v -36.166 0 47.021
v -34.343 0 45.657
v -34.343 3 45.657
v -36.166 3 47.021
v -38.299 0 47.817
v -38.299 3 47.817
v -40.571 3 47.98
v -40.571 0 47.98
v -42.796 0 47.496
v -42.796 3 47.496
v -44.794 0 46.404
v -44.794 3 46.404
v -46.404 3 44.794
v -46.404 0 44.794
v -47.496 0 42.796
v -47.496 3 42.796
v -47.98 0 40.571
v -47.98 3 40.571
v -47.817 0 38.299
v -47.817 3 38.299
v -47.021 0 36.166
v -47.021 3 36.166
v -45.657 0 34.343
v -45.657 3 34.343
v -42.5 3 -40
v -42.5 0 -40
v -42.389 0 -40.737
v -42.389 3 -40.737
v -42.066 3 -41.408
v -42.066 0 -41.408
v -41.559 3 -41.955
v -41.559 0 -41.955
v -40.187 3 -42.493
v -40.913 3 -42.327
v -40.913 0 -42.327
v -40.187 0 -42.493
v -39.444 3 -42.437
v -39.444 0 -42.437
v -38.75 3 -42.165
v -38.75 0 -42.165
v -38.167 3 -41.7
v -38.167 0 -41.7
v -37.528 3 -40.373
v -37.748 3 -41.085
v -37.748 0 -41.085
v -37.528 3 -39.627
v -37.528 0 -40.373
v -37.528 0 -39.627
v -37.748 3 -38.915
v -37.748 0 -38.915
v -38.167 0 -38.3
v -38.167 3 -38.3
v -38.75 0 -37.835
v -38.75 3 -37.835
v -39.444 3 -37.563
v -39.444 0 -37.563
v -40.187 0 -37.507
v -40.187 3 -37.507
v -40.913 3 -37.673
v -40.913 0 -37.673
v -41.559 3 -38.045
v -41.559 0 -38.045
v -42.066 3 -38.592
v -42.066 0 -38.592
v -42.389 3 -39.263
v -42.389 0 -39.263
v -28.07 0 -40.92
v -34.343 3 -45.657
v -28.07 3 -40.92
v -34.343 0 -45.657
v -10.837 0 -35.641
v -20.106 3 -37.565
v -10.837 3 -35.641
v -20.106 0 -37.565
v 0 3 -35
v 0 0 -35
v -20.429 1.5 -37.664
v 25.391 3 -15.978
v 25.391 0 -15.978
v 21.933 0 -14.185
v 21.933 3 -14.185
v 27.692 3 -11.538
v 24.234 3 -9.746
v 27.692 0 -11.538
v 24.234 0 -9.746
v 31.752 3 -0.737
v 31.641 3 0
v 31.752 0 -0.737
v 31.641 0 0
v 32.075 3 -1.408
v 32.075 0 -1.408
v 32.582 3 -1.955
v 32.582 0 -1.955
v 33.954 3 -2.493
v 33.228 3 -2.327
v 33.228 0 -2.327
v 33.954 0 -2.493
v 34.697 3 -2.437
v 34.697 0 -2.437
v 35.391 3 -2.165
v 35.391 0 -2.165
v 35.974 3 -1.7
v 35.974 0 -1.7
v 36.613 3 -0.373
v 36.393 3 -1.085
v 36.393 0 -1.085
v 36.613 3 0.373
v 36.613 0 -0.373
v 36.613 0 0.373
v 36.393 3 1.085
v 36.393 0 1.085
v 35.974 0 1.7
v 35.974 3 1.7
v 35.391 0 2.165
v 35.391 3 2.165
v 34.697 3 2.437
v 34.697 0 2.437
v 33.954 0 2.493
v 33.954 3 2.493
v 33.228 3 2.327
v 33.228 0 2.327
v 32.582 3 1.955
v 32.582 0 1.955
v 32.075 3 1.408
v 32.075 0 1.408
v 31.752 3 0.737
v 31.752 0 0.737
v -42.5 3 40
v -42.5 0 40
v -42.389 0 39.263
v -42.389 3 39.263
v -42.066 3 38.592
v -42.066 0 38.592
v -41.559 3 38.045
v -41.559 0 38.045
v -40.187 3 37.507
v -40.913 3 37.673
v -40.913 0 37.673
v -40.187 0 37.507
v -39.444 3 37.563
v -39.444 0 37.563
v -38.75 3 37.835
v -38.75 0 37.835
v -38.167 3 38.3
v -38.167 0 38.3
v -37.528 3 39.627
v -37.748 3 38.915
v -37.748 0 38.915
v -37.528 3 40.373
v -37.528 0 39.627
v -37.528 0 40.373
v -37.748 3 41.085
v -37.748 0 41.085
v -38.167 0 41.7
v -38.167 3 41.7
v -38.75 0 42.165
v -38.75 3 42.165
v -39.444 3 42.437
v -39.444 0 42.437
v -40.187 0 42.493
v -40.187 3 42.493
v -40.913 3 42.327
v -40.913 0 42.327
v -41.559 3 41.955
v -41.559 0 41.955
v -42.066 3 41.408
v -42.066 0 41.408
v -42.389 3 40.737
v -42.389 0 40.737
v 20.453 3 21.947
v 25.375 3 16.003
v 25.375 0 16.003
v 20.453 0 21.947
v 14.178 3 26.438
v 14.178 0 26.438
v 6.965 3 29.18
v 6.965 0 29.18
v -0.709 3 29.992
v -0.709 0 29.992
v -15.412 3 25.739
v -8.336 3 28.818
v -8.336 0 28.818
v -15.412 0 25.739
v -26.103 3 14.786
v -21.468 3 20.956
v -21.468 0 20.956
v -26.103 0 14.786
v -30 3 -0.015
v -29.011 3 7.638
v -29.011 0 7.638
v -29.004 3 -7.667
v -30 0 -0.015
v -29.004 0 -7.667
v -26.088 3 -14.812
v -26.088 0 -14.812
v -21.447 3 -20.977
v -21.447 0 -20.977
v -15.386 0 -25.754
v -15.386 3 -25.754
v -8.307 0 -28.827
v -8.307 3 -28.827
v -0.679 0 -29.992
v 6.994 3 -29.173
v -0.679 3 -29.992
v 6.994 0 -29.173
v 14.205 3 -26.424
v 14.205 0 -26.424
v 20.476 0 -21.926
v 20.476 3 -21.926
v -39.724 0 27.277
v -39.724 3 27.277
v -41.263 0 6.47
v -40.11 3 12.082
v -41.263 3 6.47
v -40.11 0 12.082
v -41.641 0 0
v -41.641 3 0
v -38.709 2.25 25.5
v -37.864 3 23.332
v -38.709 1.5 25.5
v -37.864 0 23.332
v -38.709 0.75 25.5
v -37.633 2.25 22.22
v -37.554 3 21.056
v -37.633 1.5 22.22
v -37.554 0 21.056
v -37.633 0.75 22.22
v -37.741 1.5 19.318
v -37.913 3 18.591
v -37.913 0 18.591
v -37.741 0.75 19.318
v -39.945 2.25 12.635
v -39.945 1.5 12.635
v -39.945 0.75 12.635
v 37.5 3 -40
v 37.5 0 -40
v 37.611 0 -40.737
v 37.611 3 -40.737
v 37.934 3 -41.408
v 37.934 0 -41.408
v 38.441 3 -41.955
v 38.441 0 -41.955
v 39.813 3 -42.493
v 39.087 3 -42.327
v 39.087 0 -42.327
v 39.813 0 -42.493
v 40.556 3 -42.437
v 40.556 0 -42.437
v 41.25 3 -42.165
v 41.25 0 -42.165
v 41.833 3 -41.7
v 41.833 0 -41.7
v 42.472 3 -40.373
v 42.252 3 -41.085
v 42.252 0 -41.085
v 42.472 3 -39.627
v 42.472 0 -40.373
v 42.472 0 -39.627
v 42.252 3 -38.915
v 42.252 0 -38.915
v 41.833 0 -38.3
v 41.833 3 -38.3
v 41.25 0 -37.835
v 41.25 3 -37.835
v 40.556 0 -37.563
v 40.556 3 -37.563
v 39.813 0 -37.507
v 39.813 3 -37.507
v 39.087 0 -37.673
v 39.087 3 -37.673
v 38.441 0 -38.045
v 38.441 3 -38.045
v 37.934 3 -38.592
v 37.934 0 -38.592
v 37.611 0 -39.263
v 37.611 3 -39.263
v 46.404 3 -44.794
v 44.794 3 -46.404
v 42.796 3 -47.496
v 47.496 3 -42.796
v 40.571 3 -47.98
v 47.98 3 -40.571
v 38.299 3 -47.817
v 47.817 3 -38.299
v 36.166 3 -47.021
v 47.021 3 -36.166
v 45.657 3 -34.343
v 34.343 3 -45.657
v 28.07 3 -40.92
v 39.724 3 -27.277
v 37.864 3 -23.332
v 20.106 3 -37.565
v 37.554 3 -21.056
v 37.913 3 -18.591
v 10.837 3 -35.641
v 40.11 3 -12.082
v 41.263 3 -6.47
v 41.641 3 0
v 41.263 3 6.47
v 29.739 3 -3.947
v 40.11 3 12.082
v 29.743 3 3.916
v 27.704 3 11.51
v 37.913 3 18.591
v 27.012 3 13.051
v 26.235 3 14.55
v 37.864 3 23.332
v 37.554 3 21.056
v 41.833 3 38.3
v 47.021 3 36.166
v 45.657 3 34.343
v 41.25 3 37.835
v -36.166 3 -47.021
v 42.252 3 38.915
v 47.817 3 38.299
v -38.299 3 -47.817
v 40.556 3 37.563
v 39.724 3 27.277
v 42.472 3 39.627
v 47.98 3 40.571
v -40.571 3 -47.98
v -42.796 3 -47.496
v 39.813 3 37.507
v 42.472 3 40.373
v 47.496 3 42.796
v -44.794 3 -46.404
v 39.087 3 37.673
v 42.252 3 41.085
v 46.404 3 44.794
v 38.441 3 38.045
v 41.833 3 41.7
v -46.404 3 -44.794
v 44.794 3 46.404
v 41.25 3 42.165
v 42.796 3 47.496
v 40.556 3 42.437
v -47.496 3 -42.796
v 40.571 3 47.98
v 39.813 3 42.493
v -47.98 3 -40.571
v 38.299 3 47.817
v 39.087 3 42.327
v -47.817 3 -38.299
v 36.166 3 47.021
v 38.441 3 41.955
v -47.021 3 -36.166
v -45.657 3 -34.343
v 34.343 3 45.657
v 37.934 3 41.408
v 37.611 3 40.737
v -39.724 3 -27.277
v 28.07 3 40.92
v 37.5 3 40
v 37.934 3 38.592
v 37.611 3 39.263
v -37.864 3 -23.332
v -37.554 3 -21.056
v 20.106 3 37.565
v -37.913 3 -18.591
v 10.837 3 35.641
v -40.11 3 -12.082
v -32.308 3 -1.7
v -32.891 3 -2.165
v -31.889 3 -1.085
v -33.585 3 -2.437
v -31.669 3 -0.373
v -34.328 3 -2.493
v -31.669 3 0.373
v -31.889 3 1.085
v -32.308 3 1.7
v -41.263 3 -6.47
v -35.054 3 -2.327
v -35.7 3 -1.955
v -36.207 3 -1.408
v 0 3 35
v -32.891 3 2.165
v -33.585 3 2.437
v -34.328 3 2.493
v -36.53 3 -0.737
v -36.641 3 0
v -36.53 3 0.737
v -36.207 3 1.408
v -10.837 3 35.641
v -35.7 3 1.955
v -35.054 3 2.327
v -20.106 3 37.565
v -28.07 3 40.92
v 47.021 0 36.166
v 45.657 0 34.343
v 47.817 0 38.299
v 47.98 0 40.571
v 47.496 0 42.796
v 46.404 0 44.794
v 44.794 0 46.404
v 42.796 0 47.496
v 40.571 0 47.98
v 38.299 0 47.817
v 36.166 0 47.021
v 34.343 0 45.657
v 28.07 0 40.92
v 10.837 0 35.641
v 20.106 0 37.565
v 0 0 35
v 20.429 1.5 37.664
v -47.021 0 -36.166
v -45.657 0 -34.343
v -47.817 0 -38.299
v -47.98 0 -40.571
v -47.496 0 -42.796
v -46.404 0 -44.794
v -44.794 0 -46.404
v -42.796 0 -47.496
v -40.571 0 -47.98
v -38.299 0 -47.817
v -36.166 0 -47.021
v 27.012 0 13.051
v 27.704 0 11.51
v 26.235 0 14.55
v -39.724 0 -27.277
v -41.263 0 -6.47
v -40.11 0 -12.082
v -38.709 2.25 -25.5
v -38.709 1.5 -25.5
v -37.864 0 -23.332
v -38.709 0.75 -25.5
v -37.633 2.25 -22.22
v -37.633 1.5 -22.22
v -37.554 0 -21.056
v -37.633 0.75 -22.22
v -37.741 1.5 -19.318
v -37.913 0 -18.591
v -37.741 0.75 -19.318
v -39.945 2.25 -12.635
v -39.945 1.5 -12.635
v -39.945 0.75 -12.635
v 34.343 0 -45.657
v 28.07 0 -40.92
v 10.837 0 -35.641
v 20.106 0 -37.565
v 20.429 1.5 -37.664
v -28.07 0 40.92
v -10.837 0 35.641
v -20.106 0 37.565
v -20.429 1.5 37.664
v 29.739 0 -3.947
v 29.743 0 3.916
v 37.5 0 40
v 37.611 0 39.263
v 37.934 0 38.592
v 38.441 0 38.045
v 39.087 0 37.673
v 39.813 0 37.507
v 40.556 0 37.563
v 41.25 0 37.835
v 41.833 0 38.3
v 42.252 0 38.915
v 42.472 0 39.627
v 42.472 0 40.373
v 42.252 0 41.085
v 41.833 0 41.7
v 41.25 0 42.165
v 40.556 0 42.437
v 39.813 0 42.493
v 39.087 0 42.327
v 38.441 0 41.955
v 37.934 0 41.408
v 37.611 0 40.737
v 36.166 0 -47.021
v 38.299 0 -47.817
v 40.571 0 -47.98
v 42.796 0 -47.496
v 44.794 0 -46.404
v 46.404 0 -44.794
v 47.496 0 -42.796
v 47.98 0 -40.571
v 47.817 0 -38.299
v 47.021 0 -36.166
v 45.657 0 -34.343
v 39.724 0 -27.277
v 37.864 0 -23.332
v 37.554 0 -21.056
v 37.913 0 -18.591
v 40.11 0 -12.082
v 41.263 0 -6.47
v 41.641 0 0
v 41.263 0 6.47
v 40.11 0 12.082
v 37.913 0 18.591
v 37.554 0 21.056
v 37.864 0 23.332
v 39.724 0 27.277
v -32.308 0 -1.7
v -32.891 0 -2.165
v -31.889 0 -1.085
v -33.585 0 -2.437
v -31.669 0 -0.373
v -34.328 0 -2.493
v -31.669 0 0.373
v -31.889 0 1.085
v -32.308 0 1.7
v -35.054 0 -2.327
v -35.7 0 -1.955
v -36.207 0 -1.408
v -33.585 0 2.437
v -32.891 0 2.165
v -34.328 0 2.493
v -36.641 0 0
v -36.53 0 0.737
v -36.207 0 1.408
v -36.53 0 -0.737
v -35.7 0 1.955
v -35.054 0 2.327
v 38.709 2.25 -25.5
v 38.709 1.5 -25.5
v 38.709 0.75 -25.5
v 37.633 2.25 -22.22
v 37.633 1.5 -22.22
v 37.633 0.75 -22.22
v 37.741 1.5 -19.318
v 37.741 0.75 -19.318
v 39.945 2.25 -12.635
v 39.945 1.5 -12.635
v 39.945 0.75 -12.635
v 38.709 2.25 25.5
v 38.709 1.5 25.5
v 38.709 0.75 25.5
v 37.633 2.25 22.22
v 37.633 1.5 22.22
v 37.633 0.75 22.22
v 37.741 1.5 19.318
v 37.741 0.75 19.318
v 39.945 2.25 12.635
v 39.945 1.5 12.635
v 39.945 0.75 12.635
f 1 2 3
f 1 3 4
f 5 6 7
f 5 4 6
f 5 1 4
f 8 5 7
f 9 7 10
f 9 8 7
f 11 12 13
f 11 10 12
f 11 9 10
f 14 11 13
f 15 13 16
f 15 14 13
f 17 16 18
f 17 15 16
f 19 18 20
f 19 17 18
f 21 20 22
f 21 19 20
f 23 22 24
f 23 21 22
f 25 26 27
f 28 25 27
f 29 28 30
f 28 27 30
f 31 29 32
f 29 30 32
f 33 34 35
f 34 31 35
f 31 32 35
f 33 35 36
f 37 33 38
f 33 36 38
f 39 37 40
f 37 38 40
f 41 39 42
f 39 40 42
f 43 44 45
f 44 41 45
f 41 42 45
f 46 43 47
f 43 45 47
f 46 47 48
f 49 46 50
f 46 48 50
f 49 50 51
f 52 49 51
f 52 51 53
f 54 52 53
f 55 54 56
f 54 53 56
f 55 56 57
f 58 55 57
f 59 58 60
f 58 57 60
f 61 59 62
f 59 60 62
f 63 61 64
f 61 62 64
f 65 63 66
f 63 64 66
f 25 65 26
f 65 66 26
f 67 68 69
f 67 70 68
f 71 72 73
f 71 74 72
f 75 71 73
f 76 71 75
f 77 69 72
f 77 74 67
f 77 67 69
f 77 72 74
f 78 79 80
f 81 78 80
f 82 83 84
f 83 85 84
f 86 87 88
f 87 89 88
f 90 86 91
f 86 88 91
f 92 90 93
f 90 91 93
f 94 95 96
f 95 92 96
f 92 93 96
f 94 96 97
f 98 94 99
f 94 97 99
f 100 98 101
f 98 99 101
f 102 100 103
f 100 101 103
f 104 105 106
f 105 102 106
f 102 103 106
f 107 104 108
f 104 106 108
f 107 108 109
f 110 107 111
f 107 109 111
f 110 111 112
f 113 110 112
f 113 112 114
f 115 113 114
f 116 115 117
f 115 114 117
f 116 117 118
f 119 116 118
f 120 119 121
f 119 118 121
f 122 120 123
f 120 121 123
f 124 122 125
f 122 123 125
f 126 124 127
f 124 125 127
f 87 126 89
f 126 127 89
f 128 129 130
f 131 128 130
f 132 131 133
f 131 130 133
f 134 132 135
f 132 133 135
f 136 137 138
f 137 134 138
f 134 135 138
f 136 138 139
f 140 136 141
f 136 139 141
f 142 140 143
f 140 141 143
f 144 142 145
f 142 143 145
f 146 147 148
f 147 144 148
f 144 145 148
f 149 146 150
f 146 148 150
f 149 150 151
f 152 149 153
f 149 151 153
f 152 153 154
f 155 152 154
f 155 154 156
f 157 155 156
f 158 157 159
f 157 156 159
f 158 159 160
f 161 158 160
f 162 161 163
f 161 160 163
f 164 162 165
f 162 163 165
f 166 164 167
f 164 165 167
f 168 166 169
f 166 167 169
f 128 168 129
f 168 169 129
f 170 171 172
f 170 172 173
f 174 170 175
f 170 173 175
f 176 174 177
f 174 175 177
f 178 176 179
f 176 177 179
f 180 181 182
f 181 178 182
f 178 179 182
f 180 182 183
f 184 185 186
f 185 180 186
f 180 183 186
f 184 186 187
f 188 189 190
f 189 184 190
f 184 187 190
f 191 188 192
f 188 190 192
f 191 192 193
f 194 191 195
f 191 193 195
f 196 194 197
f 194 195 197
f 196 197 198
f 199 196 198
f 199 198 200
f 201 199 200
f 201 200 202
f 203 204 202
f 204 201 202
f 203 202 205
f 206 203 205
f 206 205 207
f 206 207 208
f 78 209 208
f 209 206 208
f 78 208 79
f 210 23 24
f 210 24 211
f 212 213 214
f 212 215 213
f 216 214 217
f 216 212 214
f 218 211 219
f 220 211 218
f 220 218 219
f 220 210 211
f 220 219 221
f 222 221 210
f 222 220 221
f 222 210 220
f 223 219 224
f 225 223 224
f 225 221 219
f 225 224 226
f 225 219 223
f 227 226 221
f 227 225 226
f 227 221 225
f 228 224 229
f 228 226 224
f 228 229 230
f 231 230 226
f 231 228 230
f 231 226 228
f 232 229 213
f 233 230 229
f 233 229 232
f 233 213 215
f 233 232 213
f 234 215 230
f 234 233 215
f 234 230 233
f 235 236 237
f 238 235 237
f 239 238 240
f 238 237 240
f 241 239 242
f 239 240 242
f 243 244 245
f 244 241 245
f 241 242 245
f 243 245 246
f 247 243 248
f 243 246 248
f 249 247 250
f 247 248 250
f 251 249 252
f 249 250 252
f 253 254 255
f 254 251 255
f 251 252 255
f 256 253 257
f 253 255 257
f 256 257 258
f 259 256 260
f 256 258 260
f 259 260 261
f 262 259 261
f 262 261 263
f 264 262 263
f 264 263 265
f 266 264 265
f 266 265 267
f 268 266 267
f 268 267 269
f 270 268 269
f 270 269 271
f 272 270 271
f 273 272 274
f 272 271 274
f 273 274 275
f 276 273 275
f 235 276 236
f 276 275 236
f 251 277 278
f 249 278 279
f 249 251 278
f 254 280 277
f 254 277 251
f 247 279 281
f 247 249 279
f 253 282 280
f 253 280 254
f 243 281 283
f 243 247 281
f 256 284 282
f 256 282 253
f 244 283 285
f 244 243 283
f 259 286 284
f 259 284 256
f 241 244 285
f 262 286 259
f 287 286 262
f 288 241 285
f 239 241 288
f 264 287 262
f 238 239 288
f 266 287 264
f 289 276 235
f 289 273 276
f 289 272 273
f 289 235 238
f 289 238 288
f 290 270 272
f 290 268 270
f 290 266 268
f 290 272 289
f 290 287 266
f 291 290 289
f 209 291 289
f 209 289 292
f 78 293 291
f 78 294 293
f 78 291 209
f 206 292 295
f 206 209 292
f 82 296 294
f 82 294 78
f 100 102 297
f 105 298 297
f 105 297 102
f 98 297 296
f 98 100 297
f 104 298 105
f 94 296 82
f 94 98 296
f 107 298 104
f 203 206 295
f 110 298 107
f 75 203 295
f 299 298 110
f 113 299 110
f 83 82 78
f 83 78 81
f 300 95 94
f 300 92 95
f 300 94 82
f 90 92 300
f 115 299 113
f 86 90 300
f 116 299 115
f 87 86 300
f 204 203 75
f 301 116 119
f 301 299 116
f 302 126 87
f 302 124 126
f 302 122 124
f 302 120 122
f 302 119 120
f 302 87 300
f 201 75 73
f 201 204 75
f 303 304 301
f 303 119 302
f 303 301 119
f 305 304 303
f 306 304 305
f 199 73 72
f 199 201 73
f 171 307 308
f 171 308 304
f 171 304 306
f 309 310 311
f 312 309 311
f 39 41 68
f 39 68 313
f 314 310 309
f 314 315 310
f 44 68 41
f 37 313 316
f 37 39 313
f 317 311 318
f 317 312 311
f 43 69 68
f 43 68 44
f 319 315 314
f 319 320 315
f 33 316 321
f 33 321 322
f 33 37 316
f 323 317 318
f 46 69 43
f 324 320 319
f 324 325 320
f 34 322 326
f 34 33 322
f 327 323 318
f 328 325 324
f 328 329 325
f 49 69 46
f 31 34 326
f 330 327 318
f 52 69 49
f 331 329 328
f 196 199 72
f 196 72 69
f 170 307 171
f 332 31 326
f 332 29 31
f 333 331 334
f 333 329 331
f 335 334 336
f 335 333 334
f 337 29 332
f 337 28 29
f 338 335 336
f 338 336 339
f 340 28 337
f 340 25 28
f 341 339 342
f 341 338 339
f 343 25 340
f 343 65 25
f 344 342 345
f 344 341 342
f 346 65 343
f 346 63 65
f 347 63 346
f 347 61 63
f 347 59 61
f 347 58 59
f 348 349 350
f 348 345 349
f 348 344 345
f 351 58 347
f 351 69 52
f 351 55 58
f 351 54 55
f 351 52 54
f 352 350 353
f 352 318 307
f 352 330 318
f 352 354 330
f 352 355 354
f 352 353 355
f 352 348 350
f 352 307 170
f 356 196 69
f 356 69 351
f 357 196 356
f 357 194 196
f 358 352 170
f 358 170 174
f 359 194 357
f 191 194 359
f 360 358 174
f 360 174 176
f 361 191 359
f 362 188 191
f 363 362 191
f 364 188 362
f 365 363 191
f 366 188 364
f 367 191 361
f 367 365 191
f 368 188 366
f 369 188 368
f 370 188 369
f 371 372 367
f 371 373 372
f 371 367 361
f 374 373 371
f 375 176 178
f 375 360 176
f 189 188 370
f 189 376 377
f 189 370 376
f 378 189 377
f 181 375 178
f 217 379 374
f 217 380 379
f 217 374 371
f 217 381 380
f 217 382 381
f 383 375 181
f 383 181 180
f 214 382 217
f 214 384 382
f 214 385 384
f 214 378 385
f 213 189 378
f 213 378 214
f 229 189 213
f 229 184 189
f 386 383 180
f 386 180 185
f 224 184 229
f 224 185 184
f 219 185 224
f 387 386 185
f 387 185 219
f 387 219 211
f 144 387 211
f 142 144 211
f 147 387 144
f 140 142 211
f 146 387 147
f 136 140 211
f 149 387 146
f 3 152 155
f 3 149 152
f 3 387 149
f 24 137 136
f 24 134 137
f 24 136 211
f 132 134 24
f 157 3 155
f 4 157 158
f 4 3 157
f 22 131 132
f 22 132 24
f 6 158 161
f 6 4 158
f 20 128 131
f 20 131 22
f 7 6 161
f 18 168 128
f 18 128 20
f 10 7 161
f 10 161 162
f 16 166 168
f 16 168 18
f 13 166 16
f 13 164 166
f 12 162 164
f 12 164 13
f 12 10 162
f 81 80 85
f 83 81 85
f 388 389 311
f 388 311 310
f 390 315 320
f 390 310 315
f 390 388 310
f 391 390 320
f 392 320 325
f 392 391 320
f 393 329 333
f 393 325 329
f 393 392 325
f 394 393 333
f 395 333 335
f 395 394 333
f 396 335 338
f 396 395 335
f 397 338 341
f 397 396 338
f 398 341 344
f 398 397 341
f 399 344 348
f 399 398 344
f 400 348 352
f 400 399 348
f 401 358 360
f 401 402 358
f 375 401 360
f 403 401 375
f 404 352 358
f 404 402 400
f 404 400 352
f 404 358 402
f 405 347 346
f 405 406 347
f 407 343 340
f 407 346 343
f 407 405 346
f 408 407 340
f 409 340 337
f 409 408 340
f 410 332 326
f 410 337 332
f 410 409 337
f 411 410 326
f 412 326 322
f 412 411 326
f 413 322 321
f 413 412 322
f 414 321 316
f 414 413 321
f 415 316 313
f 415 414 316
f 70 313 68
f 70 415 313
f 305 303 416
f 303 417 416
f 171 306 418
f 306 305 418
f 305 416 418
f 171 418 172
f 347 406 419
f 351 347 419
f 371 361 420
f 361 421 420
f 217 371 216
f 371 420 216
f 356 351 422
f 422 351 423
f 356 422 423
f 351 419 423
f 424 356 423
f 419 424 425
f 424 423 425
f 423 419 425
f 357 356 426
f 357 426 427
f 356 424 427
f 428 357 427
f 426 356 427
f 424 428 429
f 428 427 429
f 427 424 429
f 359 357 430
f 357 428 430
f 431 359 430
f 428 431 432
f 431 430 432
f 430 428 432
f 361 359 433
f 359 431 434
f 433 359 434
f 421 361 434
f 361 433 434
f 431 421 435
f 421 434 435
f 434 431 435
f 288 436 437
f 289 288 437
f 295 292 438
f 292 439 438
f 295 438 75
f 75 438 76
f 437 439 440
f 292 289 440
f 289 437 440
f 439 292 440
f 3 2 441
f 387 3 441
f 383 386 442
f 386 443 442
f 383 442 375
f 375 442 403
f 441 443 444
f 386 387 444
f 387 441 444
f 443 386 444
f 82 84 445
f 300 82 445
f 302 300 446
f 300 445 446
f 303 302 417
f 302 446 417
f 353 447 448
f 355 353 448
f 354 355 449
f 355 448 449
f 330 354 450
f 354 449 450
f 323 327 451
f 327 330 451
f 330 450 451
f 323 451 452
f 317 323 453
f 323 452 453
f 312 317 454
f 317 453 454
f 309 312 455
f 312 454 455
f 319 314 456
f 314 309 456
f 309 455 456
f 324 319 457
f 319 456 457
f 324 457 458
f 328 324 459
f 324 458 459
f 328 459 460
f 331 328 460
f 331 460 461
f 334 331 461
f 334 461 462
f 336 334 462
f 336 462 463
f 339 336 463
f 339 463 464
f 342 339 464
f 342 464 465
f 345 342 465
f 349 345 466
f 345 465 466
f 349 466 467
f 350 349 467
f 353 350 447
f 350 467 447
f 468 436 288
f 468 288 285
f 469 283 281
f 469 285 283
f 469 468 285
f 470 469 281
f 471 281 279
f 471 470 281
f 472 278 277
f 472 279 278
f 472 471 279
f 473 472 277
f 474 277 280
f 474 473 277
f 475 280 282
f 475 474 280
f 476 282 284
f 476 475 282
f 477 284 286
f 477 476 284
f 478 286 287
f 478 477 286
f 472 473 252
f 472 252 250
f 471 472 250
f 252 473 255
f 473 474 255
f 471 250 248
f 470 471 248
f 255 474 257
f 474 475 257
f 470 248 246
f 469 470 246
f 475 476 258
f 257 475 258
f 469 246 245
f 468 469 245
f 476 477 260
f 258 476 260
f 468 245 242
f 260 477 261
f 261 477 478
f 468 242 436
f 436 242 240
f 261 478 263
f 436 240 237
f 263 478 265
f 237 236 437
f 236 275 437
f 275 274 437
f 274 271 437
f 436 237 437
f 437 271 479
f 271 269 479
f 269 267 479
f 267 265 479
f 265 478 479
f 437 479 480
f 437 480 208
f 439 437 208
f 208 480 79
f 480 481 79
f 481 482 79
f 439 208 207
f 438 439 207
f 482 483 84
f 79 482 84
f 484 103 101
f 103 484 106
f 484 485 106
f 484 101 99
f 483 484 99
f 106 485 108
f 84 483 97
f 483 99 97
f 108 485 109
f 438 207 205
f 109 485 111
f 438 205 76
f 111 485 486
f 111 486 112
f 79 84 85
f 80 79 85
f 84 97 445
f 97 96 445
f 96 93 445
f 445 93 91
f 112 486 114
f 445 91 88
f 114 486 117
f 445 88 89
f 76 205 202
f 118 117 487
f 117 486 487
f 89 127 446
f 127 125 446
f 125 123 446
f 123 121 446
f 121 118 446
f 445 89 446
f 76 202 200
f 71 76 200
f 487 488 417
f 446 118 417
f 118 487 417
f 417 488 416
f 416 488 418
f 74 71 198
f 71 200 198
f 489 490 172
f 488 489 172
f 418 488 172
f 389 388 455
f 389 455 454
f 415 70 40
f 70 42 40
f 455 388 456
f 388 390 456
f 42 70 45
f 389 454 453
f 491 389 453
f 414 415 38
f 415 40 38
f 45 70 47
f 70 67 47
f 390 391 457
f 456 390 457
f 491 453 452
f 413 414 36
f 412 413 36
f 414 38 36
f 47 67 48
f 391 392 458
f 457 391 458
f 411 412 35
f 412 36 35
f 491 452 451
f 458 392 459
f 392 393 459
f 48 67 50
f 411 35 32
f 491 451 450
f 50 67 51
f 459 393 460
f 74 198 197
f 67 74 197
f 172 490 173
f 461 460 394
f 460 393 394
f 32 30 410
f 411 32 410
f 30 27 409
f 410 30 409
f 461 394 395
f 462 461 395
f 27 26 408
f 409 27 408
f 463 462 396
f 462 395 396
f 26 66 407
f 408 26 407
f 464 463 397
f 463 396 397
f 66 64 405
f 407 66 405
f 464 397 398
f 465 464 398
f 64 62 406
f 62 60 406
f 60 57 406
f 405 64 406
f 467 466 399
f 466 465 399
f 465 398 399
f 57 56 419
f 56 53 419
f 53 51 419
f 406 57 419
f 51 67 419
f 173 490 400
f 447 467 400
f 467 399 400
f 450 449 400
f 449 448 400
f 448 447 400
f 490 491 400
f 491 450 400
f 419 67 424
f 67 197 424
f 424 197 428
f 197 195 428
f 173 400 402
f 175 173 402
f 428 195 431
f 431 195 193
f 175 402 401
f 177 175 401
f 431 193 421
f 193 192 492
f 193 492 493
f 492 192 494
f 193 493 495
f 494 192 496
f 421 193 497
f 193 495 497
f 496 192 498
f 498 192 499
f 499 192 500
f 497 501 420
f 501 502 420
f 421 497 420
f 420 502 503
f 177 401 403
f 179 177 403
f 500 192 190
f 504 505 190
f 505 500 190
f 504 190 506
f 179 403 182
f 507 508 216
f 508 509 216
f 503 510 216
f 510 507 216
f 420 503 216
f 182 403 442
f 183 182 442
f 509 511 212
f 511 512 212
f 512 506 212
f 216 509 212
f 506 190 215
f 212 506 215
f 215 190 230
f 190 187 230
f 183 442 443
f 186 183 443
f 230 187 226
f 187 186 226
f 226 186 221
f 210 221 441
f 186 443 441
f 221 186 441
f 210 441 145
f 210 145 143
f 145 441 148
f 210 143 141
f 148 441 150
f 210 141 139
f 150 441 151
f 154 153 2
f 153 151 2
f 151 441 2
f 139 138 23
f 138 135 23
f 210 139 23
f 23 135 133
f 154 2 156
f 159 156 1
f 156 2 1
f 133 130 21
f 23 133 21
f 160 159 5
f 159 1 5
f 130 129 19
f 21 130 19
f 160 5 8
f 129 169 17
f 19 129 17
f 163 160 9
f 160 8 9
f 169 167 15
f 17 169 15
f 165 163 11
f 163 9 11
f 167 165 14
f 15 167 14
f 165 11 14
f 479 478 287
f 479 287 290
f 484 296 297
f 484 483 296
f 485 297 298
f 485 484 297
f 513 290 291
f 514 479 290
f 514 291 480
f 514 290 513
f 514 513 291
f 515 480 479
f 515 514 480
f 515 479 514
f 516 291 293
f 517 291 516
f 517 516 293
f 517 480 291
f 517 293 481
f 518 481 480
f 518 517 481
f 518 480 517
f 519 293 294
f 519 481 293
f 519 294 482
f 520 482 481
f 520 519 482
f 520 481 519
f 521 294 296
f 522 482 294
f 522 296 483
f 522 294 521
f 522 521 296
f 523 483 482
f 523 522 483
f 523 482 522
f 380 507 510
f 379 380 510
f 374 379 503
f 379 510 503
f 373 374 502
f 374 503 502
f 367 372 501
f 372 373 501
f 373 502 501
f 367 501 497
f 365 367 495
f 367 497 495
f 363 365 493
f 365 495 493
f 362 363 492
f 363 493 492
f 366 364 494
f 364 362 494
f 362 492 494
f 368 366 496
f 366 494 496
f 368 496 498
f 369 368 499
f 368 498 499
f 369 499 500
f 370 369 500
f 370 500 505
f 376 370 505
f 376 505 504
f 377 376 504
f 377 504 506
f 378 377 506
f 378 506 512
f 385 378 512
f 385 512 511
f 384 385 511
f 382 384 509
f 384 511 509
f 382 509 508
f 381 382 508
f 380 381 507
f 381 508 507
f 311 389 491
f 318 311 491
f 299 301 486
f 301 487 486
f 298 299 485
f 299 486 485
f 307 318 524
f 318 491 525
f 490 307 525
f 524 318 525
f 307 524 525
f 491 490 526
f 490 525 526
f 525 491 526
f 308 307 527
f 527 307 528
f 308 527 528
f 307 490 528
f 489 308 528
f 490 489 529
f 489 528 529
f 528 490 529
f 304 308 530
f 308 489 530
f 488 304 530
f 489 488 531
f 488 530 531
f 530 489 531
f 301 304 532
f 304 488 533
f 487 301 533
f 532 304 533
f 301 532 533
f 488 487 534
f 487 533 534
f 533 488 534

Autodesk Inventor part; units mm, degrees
ref_plane "YZ Plane" through (0, 0, 0) normal (1, 0, 0) x (0, 1, 0)
ref_plane "XZ Plane" through (0, 0, 0) normal (0, 1, 0) x (-1, 0, 0)
ref_plane "XY Plane" through (0, 0, 0) normal (0, 0, 1) x (1, 0, 0)
sketch "Sketch1" plane through (0, 0, 0) normal (0, 1, 0) x (-1, 0, 0)
  arc A0 (-27.704, 11.5104) -> (-27.6923, -11.5384) centre (0, 0) ccw
  line L0 (0, 0) -> (-57.7769, 0) construction
  circle A1 centre (34.141, 0) radius 2.5
  circle A2 centre (-34.141, 0) radius 2.5
  line L1 (34.141, 0) -> (-34.141, 0) construction
  line L2 (40, -40) -> (-40, -40) construction
  line L3 (-40, -40) -> (-40, 40) construction
  line L4 (-40, 40) -> (40, 40) construction
  line L5 (40, 40) -> (40, -40) construction
  line L6 (40, -40) -> (-40, 40) construction
  line L7 (-40, -40) -> (40, 40) construction
  circle A3 centre (40, -40) radius 2.5
  circle A4 centre (-40, -40) radius 2.5
  circle A5 centre (40, 40) radius 2.5
  circle A6 centre (-40, 40) radius 2.5
  arc A7 (-45.6569, -34.3431) -> (-34.3431, -45.6569) centre (-40, -40) ccw
  line L8 (-34.3431, -45.6569) -> (-45.6569, -34.3431) construction
  line L9 (-34.3431, -45.6569) -> (-23.6863, -35) construction
  line L10 (-23.6863, -35) -> (0, -35) construction
  spline S0 degree 2 poles (-34.3431, -45.6569) (-23.6863, -35) (0, -35) knots 1 1 1 2 2 2
  arc A8 (-25.3751, 16.0032) -> (-27.704, 11.5104) centre (0, 0) ccw
  line L11 (-45.6569, -34.3431) -> (-35, -23.6863) construction
  line L12 (-35, -23.6863) -> (-35, -18) construction
  line L13 (-35, -18) -> (-41.641, -18) construction
  line L14 (-41.641, -18) -> (-41.641, 0) construction
  spline S1 degree 4 poles (-45.6569, -34.3431) (-35, -23.6863) (-35, -18) (-41.641, -18) (-41.641, 0) knots 1 1 1 1 1 2 2 2 2 2
  arc A9 (-34.3431, 45.6569) -> (-45.6569, 34.3431) centre (-40, 40) ccw
  line L15 (-34.3431, 45.6569) -> (-23.6863, 35) construction
  line L16 (-23.6863, 35) -> (0, 35) construction
  spline S2 degree 2 poles (-34.3431, 45.6569) (-23.6863, 35) (0, 35) knots 1 1 1 2 2 2
  line L17 (-45.6569, 34.3431) -> (-35, 23.6863) construction
  line L18 (-35, 23.6863) -> (-35, 18) construction
  line L19 (-35, 18) -> (-41.641, 18) construction
  line L20 (-41.641, 18) -> (-41.641, 0) construction
  spline S3 degree 4 poles (-45.6569, 34.3431) (-35, 23.6863) (-35, 18) (-41.641, 18) (-41.641, 0) knots 1 1 1 1 1 2 2 2 2 2
  line L21 (0, 0) -> (0, -30) construction
  arc A10 (34.3431, -45.6569) -> (45.6569, -34.3431) centre (40, -40) ccw
  line L22 (34.3431, -45.6569) -> (23.6863, -35) construction
  line L23 (23.6863, -35) -> (0, -35) construction
  spline S4 degree 2 poles (34.3431, -45.6569) (23.6863, -35) (0, -35) knots 1 1 1 2 2 2
  line L24 (45.6569, -34.3431) -> (35, -23.6863) construction
  line L25 (35, -23.6863) -> (35, -18) construction
  line L26 (35, -18) -> (41.641, -18) construction
  line L27 (41.641, -18) -> (41.641, 0) construction
  spline S5 degree 4 poles (45.6569, -34.3431) (35, -23.6863) (35, -18) (41.641, -18) (41.641, 0) knots 1 1 1 1 1 2 2 2 2 2
  arc A11 (45.6569, 34.3431) -> (34.3431, 45.6569) centre (40, 40) ccw
  spline S6 degree 4 poles (45.6569, 34.3431) (35, 23.6863) (35, 18) (41.641, 18) (41.641, 0) knots 1 1 1 1 1 2 2 2 2 2
  spline S7 degree 2 poles (34.3431, 45.6569) (23.6863, 35) (0, 35) knots 1 1 1 2 2 2
  line L28 (45.6569, 34.3431) -> (35, 23.6863) construction
  line L29 (35, 23.6863) -> (35, 18) construction
  line L30 (35, 18) -> (41.641, 18) construction
  line L31 (41.641, 18) -> (41.641, 0) construction
  line L32 (34.3431, 45.6569) -> (23.6863, 35) construction
  line L33 (23.6863, 35) -> (0, 35) construction
  line L34 (-25.3913, -15.9775) -> (-21.9327, -14.1847)
  line L35 (-21.9327, -14.1847) -> (-24.2337, -9.7457)
  line L36 (-24.2337, -9.7457) -> (-27.6923, -11.5384)
  line L37 (0, 0) -> (-23.0832, -11.9652) construction
  arc A12 (-27.6923, -11.5384) -> (-25.3913, -15.9775) centre (0, 0) ccw construction
  arc A13 (-25.3913, -15.9775) -> (-25.3751, 16.0032) centre (0, 0) ccw
  point P0 (-36.641, 0)
  point P1 (-30, 0)
  dimension "d0" = 60
  dimension "d4" = 5
  dimension "d5" = 68.282
  dimension "d6" = 80
  dimension "d7" = 80
  dimension "d8" = 5
  dimension "d9" = 5
  dimension "d10" = 5
  dimension "d11" = 5
  dimension "d12" = 8
  dimension "d13" = 45
  dimension "d14" = 5
  dimension "d15" = 5
  dimension "d16" = 5
  dimension "d17" = 18
  dimension "d20" = 5
  dimension "d21" = 26
  dimension "d22" = 27.4
extrude "Extrusion1" add sketch "Sketch1" along normal blind 3
properties part number "YawMotorPlate" material "Glass"
